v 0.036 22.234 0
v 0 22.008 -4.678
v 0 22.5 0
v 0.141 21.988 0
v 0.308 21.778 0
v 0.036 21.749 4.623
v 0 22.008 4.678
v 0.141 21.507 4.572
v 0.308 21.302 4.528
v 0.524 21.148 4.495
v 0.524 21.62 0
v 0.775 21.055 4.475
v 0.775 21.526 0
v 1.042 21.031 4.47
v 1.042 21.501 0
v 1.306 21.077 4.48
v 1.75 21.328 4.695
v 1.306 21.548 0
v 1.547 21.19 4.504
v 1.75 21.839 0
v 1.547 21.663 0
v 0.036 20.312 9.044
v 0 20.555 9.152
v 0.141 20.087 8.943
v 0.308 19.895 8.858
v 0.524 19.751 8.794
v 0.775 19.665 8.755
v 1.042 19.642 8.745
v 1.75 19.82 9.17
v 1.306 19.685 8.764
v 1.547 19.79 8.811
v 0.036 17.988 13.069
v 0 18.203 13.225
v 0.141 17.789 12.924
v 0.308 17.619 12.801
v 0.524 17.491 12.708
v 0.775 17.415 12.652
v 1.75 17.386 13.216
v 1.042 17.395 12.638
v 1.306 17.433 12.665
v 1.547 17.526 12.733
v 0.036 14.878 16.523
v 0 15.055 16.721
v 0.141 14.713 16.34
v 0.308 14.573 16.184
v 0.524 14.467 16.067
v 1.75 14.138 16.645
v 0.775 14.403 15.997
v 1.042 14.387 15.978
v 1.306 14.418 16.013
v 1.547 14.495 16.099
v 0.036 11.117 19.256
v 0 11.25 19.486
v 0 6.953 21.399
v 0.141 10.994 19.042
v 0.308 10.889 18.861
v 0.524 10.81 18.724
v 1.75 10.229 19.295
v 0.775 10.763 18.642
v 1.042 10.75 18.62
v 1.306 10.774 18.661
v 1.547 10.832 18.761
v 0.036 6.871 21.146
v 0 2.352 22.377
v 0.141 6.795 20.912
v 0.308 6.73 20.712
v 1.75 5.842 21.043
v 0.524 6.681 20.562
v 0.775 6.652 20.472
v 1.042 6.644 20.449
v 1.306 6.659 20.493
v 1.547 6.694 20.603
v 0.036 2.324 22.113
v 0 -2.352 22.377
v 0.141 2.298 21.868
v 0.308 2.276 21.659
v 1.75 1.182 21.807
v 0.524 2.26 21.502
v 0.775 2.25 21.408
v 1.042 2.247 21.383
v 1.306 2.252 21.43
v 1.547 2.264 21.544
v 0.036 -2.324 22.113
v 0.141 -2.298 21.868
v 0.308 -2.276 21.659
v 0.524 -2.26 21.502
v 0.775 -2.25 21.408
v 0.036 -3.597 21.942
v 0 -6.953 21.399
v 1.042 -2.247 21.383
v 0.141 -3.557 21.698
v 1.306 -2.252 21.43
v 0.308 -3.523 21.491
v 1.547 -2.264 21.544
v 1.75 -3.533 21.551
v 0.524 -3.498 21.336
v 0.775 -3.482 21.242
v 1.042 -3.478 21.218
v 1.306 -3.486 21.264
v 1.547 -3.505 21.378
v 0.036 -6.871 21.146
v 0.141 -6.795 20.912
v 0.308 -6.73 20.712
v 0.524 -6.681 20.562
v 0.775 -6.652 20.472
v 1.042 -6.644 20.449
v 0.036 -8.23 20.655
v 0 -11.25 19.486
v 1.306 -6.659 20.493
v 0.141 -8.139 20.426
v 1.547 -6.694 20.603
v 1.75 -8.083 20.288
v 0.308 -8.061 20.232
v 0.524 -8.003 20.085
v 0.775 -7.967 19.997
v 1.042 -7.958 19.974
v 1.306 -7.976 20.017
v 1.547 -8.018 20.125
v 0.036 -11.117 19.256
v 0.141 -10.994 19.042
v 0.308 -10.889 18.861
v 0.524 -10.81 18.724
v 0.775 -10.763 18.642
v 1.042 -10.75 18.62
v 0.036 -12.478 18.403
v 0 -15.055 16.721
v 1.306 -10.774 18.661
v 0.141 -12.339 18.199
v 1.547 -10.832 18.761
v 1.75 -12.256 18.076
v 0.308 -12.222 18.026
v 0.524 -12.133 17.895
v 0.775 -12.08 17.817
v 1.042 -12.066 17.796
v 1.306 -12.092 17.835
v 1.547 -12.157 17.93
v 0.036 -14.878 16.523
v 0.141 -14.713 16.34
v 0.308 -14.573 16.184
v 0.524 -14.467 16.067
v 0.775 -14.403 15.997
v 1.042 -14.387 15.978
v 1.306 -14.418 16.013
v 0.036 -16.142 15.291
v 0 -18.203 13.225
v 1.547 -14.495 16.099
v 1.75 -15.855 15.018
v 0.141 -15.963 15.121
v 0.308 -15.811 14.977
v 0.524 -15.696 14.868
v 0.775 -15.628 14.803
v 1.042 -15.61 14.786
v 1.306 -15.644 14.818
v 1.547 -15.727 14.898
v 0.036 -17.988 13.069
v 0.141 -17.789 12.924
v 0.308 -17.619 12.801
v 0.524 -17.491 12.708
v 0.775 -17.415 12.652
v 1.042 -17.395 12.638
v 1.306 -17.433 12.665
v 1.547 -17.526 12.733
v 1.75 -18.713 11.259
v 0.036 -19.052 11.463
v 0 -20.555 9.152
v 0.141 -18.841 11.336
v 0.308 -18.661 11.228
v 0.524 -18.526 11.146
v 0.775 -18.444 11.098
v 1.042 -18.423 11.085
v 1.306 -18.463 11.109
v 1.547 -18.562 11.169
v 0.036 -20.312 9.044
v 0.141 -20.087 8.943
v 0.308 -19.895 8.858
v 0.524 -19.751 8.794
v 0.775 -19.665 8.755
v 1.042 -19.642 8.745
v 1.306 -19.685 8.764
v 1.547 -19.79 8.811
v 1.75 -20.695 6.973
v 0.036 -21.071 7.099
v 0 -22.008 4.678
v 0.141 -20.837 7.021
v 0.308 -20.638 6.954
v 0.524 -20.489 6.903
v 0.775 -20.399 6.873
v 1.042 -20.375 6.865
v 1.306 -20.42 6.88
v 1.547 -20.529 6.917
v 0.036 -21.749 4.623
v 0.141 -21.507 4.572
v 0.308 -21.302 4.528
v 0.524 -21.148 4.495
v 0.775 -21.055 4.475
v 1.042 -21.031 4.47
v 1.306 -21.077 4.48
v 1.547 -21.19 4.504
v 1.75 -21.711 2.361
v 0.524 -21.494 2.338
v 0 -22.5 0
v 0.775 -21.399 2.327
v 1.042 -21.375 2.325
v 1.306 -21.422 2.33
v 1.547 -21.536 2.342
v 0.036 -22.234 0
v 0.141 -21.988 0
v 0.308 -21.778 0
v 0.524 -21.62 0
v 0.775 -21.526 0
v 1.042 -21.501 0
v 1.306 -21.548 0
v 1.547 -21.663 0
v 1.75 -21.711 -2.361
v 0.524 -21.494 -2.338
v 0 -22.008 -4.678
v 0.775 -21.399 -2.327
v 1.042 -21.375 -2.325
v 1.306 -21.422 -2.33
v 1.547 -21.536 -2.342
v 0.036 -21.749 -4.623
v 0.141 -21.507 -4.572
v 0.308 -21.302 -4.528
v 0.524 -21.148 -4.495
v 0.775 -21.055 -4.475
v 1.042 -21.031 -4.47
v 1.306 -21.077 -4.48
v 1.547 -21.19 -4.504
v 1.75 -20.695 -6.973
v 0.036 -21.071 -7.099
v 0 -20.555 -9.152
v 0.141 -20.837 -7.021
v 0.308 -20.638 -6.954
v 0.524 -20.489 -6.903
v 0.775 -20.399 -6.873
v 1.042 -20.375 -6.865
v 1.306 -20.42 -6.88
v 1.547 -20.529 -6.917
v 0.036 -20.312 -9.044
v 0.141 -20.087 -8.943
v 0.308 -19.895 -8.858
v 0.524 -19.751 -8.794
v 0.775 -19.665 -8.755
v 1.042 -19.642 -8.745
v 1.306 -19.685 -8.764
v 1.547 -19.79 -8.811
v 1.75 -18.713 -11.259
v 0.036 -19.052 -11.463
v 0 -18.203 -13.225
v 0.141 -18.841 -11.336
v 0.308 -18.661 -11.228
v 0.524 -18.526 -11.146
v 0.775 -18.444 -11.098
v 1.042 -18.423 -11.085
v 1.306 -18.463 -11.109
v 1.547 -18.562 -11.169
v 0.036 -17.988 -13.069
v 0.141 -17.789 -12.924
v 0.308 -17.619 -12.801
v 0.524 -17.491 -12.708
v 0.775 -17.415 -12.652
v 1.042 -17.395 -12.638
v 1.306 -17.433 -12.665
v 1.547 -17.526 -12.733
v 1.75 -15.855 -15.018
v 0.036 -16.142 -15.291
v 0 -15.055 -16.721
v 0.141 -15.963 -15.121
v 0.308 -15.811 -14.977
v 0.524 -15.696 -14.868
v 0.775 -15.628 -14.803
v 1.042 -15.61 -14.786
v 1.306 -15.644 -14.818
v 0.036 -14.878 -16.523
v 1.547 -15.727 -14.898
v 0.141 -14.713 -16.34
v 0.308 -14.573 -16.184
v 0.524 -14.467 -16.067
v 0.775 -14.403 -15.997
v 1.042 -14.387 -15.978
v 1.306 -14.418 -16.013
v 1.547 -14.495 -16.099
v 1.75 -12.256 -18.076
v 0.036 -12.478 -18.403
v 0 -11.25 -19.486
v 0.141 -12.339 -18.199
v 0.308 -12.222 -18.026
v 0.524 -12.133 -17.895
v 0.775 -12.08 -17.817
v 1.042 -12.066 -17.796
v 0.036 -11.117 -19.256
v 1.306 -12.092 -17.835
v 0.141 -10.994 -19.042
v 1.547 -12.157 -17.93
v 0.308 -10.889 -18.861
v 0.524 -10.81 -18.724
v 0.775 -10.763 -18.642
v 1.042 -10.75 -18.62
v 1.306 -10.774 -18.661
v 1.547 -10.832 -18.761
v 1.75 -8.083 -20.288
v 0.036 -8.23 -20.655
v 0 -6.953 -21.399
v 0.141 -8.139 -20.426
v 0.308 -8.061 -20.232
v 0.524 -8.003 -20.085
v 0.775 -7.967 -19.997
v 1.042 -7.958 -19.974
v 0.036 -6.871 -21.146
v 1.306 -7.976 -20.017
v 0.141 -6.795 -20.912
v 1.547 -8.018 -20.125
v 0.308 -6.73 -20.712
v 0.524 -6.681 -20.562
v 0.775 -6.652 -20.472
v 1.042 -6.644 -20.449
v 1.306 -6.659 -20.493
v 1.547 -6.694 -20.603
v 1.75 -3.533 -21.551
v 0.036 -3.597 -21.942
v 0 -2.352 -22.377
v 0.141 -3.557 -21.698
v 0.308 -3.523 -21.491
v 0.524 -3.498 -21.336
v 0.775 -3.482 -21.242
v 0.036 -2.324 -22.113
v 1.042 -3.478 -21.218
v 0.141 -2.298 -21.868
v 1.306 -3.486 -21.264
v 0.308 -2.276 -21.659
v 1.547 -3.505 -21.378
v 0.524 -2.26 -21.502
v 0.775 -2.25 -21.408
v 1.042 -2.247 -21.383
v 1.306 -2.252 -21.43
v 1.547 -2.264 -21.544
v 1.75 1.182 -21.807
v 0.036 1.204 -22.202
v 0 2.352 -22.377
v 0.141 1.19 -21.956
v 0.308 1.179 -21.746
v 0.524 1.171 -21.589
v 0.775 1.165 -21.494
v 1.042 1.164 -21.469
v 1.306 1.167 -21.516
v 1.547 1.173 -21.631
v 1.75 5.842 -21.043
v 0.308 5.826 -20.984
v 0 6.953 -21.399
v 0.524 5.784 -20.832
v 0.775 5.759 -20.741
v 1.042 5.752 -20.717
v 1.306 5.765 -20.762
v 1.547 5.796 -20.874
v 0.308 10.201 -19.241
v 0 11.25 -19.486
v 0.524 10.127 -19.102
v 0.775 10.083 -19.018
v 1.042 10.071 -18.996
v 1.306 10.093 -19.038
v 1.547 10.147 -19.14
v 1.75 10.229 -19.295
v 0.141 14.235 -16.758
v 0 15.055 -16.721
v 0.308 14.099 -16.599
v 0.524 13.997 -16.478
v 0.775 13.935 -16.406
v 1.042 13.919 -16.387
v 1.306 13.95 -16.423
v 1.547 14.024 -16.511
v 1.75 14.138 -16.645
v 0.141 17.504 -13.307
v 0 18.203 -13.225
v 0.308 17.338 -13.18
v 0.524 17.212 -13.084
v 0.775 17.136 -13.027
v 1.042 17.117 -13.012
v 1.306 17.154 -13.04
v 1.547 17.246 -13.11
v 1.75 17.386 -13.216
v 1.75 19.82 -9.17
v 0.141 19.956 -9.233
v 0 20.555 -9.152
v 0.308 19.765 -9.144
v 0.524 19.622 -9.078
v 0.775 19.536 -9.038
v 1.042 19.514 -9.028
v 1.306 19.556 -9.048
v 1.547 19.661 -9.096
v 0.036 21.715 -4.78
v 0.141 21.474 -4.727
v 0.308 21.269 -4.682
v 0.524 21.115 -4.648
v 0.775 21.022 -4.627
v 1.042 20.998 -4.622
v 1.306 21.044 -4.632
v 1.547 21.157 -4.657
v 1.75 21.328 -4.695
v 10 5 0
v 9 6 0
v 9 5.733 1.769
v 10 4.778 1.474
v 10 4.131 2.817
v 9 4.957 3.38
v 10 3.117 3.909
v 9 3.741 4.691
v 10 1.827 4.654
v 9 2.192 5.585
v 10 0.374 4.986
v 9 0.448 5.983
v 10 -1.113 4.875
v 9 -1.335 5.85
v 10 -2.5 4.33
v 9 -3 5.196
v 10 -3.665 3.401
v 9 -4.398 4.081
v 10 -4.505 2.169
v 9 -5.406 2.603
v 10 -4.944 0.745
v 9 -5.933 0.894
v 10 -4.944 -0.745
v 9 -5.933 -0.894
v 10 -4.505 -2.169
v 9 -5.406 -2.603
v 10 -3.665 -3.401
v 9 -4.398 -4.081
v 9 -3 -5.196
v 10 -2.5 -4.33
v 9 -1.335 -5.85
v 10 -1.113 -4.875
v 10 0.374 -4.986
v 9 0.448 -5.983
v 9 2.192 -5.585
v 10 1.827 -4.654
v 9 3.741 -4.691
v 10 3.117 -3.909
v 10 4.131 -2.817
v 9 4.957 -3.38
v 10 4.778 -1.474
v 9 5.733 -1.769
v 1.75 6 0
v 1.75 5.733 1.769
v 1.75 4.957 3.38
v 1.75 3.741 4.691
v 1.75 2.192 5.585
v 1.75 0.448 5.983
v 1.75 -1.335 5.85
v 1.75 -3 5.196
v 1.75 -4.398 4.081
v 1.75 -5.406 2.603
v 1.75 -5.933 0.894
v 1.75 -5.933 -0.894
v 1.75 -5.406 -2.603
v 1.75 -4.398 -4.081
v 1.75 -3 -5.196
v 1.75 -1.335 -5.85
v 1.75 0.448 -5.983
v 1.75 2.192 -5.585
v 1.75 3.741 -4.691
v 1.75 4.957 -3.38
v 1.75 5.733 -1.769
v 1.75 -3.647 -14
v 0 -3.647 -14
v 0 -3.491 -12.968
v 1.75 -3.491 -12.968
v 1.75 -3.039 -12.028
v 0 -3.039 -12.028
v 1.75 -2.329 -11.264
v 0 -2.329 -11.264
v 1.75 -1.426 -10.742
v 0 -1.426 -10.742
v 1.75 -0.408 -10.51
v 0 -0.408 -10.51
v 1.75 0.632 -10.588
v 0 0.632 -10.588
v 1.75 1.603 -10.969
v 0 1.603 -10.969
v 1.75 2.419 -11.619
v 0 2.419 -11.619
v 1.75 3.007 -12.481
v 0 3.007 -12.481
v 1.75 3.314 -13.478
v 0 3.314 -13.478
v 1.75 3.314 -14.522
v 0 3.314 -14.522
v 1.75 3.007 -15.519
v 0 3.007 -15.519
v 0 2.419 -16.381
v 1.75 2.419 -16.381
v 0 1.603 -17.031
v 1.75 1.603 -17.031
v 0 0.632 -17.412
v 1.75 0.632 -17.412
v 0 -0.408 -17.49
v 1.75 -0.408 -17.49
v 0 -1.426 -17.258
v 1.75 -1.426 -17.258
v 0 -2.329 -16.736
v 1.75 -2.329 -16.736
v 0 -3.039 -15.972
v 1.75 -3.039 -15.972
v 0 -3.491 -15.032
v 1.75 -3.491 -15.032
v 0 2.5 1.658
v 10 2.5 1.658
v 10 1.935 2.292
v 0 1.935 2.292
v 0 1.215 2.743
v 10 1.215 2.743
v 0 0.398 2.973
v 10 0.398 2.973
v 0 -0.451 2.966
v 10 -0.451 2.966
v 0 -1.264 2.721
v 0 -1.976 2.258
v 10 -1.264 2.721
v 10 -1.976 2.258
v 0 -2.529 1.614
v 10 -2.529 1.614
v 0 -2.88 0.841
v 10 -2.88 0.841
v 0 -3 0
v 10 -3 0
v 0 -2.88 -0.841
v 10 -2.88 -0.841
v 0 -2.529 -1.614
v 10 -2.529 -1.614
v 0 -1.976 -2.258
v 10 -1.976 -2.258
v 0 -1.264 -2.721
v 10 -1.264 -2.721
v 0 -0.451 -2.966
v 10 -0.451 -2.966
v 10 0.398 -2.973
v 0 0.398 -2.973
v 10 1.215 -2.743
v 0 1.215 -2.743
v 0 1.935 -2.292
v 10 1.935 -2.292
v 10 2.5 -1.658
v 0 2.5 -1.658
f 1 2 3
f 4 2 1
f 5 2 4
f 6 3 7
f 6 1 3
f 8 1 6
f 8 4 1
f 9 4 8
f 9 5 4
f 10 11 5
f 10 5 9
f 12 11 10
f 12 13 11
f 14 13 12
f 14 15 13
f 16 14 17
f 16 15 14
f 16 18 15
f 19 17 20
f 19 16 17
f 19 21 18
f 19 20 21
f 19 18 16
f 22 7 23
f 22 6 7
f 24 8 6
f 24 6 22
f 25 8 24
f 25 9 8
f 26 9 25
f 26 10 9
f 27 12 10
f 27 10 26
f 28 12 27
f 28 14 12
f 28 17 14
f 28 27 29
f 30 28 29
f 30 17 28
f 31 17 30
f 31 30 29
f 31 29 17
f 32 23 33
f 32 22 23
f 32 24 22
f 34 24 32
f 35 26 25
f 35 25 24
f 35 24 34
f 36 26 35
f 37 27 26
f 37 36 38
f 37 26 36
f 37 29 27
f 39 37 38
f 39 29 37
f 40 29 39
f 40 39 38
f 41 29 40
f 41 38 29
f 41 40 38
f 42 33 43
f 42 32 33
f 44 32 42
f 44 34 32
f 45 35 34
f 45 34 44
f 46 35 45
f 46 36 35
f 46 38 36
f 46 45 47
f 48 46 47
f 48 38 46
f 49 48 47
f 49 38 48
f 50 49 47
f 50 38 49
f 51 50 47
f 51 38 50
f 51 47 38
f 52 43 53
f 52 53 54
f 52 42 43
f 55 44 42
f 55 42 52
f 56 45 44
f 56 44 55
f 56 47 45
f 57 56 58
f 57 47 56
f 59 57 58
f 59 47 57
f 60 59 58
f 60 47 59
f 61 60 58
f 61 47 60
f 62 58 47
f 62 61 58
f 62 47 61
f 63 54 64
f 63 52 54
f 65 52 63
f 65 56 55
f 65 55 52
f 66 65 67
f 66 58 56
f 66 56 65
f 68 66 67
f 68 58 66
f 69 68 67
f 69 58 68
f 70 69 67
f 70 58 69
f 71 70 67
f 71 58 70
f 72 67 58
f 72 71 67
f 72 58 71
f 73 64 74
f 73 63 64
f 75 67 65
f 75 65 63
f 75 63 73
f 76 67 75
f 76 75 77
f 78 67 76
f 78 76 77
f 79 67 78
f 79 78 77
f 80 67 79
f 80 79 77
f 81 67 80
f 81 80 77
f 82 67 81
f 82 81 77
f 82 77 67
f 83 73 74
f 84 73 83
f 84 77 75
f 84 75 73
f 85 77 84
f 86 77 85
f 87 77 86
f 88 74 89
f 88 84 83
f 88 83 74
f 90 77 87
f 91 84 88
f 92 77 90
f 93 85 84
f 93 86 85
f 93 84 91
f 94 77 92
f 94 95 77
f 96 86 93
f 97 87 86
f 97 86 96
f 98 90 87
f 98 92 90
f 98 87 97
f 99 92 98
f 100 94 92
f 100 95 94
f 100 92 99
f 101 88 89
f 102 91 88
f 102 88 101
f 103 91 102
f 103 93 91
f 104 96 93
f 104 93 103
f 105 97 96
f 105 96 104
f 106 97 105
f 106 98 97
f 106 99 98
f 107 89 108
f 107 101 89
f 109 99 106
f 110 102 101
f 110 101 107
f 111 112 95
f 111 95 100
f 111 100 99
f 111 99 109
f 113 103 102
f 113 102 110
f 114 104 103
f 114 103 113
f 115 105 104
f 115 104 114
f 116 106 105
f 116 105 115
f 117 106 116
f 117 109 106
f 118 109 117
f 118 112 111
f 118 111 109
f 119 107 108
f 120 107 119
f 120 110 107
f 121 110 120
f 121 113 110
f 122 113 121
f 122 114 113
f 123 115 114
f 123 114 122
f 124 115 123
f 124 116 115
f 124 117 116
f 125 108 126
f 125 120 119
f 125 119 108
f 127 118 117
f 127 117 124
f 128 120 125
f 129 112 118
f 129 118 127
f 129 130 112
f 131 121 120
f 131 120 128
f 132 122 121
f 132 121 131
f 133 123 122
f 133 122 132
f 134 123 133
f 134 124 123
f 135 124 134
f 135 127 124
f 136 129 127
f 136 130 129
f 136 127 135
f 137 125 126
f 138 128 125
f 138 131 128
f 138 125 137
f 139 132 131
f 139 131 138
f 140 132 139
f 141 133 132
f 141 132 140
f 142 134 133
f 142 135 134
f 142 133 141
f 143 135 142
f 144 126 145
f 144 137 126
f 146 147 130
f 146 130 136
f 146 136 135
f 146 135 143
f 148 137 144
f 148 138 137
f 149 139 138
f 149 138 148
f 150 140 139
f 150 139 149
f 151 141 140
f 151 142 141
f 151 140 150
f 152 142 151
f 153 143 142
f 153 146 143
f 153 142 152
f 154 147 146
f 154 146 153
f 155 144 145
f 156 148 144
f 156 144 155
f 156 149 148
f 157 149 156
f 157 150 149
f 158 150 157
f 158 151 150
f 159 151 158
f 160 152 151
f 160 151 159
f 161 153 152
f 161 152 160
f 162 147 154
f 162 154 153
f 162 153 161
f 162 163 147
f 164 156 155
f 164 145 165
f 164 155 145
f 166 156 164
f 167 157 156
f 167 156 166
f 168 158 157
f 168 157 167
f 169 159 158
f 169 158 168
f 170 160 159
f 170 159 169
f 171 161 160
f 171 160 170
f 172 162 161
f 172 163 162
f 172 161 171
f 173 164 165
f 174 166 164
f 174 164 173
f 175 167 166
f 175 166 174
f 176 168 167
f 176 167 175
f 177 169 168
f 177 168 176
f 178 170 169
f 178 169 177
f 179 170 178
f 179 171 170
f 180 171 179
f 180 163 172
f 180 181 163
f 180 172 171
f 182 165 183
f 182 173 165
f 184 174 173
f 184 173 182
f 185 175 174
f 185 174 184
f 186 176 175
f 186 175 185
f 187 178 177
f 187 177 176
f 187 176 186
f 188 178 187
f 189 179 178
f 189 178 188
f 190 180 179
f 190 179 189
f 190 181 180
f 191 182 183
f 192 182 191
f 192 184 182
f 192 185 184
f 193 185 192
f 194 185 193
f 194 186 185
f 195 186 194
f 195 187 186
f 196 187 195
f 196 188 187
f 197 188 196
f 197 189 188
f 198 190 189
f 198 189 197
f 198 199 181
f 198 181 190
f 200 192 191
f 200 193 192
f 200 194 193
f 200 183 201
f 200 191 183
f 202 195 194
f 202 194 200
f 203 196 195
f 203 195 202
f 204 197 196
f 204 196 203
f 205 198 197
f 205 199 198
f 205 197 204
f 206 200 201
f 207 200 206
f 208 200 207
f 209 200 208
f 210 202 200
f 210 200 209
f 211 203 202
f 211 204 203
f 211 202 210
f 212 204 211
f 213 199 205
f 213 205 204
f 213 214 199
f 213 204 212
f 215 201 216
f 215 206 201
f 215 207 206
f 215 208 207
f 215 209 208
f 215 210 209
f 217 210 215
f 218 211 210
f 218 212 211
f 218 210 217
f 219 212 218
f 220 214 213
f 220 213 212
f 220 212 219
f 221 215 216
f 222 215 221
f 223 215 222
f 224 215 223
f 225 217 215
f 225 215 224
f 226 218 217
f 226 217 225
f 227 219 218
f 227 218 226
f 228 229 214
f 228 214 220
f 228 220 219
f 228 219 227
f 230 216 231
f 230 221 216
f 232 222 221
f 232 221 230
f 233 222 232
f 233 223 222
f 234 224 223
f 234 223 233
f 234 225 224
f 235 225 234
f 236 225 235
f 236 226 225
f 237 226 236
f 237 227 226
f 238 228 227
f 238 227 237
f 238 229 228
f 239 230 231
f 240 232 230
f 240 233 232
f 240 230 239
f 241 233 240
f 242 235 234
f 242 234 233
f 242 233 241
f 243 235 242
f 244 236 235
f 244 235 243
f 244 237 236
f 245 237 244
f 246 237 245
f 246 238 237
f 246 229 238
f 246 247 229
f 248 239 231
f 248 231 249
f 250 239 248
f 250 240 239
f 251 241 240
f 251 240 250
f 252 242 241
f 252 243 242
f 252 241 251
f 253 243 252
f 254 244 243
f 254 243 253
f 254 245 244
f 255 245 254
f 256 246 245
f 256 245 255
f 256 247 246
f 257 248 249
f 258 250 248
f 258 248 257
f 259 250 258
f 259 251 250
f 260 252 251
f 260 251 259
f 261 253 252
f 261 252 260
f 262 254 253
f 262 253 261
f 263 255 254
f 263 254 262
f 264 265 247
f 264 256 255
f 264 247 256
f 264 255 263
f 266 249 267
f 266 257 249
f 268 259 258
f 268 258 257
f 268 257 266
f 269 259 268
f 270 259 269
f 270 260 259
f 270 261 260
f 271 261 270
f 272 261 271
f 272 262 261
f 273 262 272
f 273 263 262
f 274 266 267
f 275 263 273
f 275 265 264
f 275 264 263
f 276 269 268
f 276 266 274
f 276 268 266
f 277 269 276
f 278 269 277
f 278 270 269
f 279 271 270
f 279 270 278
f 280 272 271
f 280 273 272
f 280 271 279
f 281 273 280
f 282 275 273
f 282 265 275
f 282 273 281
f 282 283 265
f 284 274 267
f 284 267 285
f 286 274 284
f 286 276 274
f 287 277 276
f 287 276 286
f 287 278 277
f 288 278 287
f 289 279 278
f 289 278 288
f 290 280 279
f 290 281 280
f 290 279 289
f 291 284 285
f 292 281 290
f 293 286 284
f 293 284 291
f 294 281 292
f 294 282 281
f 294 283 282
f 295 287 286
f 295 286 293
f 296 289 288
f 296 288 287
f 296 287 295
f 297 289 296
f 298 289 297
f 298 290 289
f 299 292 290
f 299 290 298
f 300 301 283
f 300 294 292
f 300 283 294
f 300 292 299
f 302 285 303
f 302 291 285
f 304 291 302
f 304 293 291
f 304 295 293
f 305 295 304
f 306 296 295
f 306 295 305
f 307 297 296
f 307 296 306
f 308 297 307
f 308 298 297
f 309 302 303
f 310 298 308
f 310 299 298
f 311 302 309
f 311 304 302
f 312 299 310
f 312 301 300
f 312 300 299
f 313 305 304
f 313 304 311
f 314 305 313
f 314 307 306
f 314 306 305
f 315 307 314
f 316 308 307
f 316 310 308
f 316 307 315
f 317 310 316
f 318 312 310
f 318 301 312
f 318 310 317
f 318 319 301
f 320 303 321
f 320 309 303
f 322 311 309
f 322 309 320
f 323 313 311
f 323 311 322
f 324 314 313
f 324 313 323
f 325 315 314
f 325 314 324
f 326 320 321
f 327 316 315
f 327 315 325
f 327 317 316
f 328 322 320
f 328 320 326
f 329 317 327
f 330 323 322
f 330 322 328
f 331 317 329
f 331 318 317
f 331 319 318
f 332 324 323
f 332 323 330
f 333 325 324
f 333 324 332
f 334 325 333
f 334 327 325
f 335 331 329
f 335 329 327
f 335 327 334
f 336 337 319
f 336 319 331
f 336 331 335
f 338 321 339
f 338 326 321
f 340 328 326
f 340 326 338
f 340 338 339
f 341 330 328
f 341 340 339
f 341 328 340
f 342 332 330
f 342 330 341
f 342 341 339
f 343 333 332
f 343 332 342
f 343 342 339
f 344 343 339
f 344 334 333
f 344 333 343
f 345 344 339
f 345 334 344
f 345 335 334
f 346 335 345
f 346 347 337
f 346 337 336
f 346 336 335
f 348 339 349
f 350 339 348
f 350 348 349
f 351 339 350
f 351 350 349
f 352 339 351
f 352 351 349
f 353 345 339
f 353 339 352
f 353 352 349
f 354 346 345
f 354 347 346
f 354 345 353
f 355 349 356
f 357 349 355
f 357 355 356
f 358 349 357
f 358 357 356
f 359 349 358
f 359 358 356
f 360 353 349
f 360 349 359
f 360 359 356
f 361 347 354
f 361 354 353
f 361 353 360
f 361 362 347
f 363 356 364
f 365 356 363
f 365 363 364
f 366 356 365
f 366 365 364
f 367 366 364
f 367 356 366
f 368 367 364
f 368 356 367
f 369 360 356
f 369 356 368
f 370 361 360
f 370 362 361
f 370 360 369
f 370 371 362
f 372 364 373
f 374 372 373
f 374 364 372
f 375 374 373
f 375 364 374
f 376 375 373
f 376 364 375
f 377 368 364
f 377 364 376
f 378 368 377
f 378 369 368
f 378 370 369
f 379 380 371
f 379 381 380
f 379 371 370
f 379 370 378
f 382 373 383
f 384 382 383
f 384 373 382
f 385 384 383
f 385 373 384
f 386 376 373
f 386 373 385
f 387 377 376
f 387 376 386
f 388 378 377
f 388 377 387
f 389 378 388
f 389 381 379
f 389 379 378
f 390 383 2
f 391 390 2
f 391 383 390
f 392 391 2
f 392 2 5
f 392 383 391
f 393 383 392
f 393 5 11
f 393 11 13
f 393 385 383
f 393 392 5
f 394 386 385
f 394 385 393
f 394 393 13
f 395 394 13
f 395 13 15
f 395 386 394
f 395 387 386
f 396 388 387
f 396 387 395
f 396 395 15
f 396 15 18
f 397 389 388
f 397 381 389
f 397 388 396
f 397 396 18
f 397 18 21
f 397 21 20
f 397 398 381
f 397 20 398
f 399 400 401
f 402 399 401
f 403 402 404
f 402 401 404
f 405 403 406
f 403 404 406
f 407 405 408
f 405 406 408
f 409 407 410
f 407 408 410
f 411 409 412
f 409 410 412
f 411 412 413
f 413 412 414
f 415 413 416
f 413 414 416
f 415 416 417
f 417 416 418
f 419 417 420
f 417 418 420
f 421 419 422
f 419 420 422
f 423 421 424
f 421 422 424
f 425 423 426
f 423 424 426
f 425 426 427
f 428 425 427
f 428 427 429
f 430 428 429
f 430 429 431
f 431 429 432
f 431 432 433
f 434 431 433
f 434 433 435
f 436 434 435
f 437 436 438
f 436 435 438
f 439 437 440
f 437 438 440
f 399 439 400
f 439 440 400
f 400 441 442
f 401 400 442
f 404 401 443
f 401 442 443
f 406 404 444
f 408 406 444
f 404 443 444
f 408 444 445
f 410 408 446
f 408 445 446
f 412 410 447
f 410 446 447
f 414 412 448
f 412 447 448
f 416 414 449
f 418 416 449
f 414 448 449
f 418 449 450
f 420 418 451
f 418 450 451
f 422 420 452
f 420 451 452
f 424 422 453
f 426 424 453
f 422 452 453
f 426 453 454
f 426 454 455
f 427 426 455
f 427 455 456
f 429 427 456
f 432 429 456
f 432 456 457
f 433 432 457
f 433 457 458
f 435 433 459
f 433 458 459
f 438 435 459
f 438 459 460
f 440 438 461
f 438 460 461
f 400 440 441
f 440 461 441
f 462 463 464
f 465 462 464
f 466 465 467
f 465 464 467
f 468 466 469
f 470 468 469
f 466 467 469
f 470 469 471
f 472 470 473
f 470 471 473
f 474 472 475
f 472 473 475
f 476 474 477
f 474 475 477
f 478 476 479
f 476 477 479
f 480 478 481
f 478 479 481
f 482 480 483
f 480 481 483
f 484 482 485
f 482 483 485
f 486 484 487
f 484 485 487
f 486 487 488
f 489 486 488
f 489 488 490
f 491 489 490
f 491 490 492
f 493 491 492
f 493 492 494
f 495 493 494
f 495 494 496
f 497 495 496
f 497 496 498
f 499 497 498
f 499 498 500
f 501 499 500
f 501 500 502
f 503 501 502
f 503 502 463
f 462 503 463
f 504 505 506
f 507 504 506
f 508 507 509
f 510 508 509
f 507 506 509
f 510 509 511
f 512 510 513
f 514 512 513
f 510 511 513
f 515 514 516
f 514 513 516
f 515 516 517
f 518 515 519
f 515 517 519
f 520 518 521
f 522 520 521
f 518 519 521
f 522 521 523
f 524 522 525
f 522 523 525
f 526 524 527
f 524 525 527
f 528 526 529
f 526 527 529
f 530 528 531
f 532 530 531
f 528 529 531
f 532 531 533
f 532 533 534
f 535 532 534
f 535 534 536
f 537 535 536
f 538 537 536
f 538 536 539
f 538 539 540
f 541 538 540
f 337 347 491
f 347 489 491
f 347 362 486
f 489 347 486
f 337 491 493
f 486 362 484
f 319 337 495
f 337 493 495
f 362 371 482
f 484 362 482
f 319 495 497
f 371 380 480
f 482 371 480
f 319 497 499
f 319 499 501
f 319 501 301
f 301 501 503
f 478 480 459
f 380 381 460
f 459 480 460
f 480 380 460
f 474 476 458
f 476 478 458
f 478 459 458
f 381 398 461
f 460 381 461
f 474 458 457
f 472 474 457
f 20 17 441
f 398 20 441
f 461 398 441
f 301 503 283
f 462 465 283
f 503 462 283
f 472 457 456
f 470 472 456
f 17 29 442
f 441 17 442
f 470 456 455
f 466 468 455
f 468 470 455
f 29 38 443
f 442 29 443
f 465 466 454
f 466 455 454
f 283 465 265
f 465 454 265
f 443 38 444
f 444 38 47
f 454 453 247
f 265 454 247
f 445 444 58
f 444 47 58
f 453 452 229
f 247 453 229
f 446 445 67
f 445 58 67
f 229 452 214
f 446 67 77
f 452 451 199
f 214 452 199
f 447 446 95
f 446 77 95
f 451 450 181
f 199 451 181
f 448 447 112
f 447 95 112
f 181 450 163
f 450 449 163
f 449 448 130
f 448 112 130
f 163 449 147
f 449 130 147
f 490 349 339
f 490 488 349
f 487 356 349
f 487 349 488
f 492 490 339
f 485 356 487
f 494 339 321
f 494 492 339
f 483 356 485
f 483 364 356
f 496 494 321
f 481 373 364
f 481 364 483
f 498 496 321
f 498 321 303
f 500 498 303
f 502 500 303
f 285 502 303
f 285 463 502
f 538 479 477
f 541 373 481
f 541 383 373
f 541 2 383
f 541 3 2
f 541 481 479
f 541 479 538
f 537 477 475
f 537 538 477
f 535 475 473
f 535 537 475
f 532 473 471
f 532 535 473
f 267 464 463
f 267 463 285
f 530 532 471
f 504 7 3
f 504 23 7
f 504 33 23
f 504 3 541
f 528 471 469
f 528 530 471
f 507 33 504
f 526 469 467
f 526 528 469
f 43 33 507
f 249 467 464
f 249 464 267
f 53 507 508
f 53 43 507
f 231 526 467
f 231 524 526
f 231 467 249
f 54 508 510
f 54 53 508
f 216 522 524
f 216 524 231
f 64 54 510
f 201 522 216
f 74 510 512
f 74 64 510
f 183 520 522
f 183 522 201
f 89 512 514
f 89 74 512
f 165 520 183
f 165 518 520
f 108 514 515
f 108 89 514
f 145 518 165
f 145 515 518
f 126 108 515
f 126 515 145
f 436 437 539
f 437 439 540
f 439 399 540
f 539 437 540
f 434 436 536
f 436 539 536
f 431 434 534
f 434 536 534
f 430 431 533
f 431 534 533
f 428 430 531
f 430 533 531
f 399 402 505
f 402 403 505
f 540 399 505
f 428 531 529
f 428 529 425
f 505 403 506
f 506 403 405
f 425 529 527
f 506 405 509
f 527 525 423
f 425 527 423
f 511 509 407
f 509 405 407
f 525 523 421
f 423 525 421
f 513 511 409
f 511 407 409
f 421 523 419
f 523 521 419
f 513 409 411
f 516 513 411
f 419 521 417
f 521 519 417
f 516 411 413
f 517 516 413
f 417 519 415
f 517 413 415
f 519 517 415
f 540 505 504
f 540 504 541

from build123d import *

# Parameters (mm, degrees)
POCKET_DEPTH    = 10.001
CHAMFER_SIZE    = 1
SKETCH002_R     = 3.5
POCKET001_DEPTH = 5


with BuildPart() as part:
    # Sketch → Revolution (revolve)
    with BuildSketch(Plane.XY):
        with BuildLine():
            Line((0, 0), (0, 22.5))
            ThreePointArc((0, 22.5), (0.646447, 21.564586), (1.75, 21.838562))
            Line((1.75, 6), (1.75, 21.838562))
            Line((10, 6), (1.75, 6))
            Line((10, 0), (10, 6))
            Line((0, 0), (10, 0))
        make_face()
    revolve(axis=Axis((0, 0, 0), (1, 0, 0)))

    # Sketch001 (on Face5 of Revolution) → Pocket (cut, through all)
    with BuildSketch(Plane.YZ.offset(10)):
        with BuildLine():
            ThreePointArc((2.5, 1.658312), (-3, 0), (2.5, -1.658312))
            Line((2.5, 1.658312), (2.5, -1.658312))
        make_face()
    extrude(amount=-POCKET_DEPTH, mode=Mode.SUBTRACT)

    # Chamfer
    chamfer_edges = [part.edges().sort_by_distance(p)[0] for p in [
        (10, -6, 0),
    ]]
    chamfer(chamfer_edges, length=CHAMFER_SIZE)

    # Sketch002 (on Face6 of Chamfer) → Pocket001 (cut)
    with BuildSketch(Plane(origin=(0, 0, 0), x_dir=(0, -1, 0), z_dir=(-1, 0, 0))):
        with Locations((0.146868, -14)):
            Circle(SKETCH002_R)
    extrude(amount=-POCKET001_DEPTH, mode=Mode.SUBTRACT)


solid = part.part
